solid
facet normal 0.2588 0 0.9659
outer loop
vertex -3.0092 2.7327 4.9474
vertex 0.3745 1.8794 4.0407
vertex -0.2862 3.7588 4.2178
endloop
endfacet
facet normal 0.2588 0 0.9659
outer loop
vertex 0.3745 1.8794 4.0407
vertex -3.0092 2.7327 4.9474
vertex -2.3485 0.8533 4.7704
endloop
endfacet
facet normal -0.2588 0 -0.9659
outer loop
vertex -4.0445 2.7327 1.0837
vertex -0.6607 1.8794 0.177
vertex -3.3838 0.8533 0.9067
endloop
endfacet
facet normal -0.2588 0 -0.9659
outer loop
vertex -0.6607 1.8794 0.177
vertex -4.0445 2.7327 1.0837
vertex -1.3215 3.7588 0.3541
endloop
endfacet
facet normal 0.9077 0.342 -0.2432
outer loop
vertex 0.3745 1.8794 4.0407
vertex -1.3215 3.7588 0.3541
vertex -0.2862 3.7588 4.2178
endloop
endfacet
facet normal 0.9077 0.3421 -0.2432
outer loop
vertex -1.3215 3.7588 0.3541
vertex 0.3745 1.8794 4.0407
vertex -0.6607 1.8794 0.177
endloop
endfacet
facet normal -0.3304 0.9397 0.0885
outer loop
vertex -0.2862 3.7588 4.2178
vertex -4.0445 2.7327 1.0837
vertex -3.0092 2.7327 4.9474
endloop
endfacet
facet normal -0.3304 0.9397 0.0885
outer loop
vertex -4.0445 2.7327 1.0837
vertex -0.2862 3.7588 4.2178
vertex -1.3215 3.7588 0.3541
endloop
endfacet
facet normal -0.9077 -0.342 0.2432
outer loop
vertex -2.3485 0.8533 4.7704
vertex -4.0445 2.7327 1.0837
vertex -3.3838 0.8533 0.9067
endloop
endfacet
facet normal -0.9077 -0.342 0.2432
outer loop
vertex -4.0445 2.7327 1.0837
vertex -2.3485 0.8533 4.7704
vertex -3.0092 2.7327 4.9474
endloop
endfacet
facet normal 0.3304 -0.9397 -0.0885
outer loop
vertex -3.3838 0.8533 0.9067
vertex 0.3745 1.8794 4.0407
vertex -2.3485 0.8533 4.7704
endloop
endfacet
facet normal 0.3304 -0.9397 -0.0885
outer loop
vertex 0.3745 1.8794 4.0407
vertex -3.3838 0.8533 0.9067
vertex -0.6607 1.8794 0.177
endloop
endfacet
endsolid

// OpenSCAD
// Three rotations stacked — the order matters; rotating the same
// brick with axis-angle then Euler then scalar exercises all three
// rotate code paths in sequence.
rotate(90, [0, 0, 1])
  rotate([15, 0, 0])
    rotate(20)
      translate([2, 0, 0])
        cube([2, 3, 4]);
